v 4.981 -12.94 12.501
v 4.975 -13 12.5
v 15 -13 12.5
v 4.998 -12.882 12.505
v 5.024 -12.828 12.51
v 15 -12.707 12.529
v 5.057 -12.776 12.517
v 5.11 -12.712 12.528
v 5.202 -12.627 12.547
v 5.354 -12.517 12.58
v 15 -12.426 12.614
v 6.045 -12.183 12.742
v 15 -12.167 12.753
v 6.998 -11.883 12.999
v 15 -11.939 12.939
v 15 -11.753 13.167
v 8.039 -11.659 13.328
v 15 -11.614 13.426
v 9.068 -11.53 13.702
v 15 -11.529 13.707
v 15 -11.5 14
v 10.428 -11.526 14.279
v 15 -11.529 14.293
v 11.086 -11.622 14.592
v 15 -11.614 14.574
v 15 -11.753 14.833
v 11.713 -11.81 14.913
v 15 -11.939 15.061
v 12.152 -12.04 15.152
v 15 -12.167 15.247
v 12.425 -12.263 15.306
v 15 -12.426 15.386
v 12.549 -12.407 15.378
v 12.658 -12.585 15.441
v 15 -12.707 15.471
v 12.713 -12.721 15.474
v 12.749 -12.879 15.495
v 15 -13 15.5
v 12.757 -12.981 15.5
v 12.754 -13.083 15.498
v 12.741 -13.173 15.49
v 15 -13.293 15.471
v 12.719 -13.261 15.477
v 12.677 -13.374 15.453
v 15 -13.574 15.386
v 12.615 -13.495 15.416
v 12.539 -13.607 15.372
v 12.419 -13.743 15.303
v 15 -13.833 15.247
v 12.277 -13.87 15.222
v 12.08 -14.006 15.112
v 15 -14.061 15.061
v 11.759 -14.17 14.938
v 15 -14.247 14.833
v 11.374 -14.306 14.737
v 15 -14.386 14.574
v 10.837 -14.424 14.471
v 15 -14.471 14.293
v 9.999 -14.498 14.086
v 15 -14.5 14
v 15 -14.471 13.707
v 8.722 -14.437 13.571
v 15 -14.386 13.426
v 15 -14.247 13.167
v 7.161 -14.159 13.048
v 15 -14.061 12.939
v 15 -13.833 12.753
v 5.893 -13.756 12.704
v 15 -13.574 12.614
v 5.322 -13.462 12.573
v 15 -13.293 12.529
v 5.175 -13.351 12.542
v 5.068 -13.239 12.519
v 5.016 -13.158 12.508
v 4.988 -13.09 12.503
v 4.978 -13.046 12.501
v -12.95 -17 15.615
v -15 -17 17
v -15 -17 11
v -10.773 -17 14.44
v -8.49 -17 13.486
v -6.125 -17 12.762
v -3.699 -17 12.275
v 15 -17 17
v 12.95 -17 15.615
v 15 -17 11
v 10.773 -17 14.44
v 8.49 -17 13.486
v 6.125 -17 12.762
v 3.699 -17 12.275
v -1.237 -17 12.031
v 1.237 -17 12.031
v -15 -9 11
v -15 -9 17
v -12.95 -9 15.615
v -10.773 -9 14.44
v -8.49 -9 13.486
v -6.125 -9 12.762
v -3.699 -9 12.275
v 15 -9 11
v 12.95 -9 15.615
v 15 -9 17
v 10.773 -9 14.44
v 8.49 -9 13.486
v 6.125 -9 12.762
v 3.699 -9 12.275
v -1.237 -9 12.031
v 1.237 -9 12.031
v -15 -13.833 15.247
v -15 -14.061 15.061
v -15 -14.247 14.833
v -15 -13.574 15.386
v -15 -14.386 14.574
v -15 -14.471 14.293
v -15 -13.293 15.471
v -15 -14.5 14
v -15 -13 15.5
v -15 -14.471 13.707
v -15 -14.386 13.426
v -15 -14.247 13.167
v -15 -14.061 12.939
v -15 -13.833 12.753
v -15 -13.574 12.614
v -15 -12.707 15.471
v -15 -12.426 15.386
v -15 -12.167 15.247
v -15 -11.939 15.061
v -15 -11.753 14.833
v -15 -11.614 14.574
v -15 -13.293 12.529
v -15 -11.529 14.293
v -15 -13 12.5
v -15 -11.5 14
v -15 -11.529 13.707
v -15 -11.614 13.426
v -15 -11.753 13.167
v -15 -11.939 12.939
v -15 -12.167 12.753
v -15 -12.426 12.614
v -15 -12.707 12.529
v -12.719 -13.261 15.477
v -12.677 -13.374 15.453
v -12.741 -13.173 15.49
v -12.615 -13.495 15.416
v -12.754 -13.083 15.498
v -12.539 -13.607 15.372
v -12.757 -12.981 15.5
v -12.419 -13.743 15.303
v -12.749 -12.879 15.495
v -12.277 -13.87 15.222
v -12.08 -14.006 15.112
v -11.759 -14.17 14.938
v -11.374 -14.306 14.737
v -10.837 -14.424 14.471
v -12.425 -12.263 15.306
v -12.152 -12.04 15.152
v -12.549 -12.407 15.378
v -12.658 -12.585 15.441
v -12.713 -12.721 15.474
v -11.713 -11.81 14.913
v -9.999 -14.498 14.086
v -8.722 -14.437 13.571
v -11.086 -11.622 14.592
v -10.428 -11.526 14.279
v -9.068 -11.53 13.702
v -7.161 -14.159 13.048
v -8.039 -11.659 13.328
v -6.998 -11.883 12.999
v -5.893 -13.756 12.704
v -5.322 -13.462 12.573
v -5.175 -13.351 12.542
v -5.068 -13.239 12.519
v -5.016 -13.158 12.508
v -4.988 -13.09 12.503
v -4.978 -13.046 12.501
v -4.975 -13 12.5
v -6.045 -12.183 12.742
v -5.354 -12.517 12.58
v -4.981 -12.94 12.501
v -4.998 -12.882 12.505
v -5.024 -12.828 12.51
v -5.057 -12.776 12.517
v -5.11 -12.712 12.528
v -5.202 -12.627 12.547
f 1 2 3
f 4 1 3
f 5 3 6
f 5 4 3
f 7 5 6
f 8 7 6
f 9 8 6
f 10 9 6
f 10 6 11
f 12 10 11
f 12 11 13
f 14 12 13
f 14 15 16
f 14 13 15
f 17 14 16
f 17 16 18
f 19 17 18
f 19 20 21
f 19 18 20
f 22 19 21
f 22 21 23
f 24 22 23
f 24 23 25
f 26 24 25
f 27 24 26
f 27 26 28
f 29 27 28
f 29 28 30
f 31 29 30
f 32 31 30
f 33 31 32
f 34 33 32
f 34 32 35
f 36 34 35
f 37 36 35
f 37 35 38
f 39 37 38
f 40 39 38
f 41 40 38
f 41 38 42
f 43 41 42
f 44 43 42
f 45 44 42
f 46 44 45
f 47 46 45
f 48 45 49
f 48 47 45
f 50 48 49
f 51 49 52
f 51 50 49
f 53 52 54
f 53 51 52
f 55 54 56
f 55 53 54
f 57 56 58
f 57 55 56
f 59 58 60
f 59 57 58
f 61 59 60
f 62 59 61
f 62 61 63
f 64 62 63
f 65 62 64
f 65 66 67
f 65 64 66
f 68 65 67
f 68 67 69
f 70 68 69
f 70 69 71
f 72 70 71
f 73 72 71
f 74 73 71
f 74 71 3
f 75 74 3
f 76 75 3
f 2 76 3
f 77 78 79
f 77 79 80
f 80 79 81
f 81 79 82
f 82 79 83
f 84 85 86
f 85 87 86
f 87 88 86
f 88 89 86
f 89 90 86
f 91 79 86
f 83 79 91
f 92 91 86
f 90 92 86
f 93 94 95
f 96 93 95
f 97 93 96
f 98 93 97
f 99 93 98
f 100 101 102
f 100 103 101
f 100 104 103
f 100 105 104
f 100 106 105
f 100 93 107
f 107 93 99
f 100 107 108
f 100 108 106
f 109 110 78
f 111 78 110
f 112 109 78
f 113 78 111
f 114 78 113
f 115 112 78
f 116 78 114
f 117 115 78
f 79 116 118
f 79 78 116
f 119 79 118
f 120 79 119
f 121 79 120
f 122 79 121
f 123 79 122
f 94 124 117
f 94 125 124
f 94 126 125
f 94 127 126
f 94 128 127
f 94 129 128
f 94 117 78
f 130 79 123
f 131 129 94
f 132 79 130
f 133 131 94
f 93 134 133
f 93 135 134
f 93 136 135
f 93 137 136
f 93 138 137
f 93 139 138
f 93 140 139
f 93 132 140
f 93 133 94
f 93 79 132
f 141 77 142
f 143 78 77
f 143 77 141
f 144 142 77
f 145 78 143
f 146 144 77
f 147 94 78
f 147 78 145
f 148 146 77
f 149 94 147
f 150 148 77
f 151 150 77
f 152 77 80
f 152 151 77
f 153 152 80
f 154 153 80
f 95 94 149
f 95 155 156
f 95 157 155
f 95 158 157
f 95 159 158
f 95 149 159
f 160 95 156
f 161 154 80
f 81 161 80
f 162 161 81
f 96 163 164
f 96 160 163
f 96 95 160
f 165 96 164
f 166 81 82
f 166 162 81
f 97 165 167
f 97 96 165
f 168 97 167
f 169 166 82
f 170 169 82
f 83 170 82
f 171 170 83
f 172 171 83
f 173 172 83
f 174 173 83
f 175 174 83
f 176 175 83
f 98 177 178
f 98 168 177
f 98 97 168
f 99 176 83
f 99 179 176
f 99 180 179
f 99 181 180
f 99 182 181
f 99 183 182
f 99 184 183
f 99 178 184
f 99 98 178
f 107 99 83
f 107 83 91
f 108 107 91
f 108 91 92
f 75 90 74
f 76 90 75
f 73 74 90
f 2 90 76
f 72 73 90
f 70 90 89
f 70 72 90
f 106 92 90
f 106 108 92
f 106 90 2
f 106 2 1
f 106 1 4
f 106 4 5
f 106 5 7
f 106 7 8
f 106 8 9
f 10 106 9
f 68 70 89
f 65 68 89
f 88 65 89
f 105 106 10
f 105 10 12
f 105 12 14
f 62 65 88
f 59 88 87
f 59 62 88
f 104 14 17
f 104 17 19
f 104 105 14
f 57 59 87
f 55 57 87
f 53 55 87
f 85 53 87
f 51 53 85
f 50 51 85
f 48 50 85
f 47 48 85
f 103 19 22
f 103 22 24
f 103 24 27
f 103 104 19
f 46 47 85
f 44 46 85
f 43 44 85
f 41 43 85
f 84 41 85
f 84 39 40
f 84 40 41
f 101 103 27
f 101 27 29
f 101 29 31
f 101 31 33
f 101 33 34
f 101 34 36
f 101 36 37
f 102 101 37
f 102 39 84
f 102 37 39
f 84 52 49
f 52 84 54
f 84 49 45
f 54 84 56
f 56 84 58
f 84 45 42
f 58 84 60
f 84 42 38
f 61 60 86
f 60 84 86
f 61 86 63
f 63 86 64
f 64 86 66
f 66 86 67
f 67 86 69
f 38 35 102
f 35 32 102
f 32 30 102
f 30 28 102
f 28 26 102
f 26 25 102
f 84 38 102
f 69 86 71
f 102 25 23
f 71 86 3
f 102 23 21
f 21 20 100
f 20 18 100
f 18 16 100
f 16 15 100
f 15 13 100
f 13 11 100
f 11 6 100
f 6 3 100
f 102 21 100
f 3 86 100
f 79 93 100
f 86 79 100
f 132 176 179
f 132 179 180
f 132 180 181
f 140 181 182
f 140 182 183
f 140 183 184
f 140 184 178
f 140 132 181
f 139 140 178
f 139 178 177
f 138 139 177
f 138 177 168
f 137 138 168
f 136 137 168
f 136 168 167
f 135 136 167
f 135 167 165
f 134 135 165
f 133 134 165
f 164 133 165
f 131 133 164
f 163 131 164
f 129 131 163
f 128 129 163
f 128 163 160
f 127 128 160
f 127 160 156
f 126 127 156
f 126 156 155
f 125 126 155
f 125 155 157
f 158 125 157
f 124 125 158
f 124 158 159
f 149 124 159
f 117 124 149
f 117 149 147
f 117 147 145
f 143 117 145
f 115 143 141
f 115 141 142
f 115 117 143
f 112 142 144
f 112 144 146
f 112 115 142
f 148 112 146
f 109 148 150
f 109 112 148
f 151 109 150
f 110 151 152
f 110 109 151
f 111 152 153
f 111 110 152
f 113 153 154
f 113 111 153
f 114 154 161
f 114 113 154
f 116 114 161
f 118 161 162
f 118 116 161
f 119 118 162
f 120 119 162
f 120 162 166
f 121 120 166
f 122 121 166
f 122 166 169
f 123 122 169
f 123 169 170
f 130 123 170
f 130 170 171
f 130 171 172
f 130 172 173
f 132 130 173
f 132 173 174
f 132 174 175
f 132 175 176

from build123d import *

# Parameters (mm, degrees)
CYLINDER2792_R     = 1.5
CYLINDER2792_DEPTH = 64
CYLINDER2791_R     = 38
CYLINDER2791_DEPTH = 30
BOX975_W           = 2
BOX975_H           = 6
BOX975_DEPTH       = 6
BOX976_W           = 2
BOX976_H           = 6
BOX976_DEPTH       = 6
BOX977_W           = 2
BOX977_H           = 6
BOX977_DEPTH       = 6
BOX978_W           = 2
BOX978_H           = 6
BOX978_DEPTH       = 6
BOX979_W           = 2
BOX979_H           = 6
BOX979_DEPTH       = 6
BOX981_W           = 2
BOX981_H           = 6
BOX981_DEPTH       = 6
TUBE137_R          = 21
TUBE137_R_2        = 2
TUBE137_DEPTH      = 64
TUBE138_R          = 25
TUBE138_R_2        = 2
TUBE138_DEPTH      = 26
BOX980_W           = 30
BOX980_H           = 64
BOX980_DEPTH       = 18
BOX974_W           = 30
BOX974_H           = 8
BOX974_DEPTH       = 18


with BuildPart() as v_lec2762:
    # Cylinder2792 → Cylinder2792 (new body)
    with BuildSketch(Plane(origin=(-26, -13, 14), x_dir=(0, 0, -1), z_dir=(1, 0, 0))):
        Circle(CYLINDER2792_R)
    extrude(amount=CYLINDER2792_DEPTH)


with BuildPart() as v_lec2761:
    # Cylinder2791 → Cylinder2791 (new body)
    with BuildSketch(Plane.XY):
        Circle(CYLINDER2791_R)
    extrude(amount=CYLINDER2791_DEPTH)


with BuildPart() as krychle974:
    # Box975 → Box975 (new body)
    with BuildSketch(Plane(origin=(-12, -4, 10), x_dir=(1, 0, 0), z_dir=(0, 0, 1))):
        with Locations((1, 3)):
            Rectangle(BOX975_W, BOX975_H)
    extrude(amount=BOX975_DEPTH)


with BuildPart() as krychle975:
    # Box976 → Box976 (new body)
    with BuildSketch(Plane(origin=(10, 26, 10), x_dir=(1, 0, 0), z_dir=(0, 0, 1))):
        with Locations((1, 3)):
            Rectangle(BOX976_W, BOX976_H)
    extrude(amount=BOX976_DEPTH)


with BuildPart() as krychle976:
    # Box977 → Box977 (new body)
    with BuildSketch(Plane(origin=(-12, 26, 10), x_dir=(1, 0, 0), z_dir=(0, 0, 1))):
        with Locations((1, 3)):
            Rectangle(BOX977_W, BOX977_H)
    extrude(amount=BOX977_DEPTH)


with BuildPart() as krychle977:
    # Box978 → Box978 (new body)
    with BuildSketch(Plane(origin=(10, 12, 10), x_dir=(1, 0, 0), z_dir=(0, 0, 1))):
        with Locations((1, 3)):
            Rectangle(BOX978_W, BOX978_H)
    extrude(amount=BOX978_DEPTH)


with BuildPart() as krychle978:
    # Box979 → Box979 (new body)
    with BuildSketch(Plane(origin=(-12, 12, 10), x_dir=(1, 0, 0), z_dir=(0, 0, 1))):
        with Locations((1, 3)):
            Rectangle(BOX979_W, BOX979_H)
    extrude(amount=BOX979_DEPTH)


with BuildPart() as compound1243:
    # Box981 → Box981 (new body)
    with BuildSketch(Plane(origin=(10, -4, 10), x_dir=(1, 0, 0), z_dir=(0, 0, 1))):
        with Locations((1, 3)):
            Rectangle(BOX981_W, BOX981_H)
    extrude(amount=BOX981_DEPTH)

    # Compound1243: union Krychle974, Krychle975, Krychle976, Krychle977, Krychle978
    add(krychle974.part)
    add(krychle975.part)
    add(krychle976.part)
    add(krychle977.part)
    add(krychle978.part)


with BuildPart() as tube137:
    # Tube137 → Tube137 (new body)
    with BuildSketch(Plane(origin=(0, 61, 37), x_dir=(1, 0, 0), z_dir=(0, -1, 0))):
        Circle(TUBE137_R)
        Circle(TUBE137_R_2, mode=Mode.SUBTRACT)
    extrude(amount=TUBE137_DEPTH)


with BuildPart() as tube138:
    # Tube138 → Tube138 (new body)
    with BuildSketch(Plane(origin=(0, -3, 37), x_dir=(1, 0, 0), z_dir=(0, -1, 0))):
        Circle(TUBE138_R)
        Circle(TUBE138_R_2, mode=Mode.SUBTRACT)
    extrude(amount=TUBE138_DEPTH)


with BuildPart() as common007:
    # Box980 → Box980 (new body)
    with BuildSketch(Plane(origin=(-15, -17, 11), x_dir=(1, 0, 0), z_dir=(0, 0, 1))):
        with Locations((15, 32)):
            Rectangle(BOX980_W, BOX980_H)
    extrude(amount=BOX980_DEPTH)

    # Cut1049: cut Tube138
    add(tube138.part, mode=Mode.SUBTRACT)

    # Cut1050: cut Tube137
    add(tube137.part, mode=Mode.SUBTRACT)

    # Cut1051: cut Compound1243
    add(compound1243.part, mode=Mode.SUBTRACT)

    # Common007: intersect Válec2761
    add(v_lec2761.part, mode=Mode.INTERSECT)


with BuildPart() as cut1052:
    # Box974 → Box974 (new body)
    with BuildSketch(Plane(origin=(-15, -17, 11), x_dir=(1, 0, 0), z_dir=(0, 0, 1))):
        with Locations((15, 4)):
            Rectangle(BOX974_W, BOX974_H)
    extrude(amount=BOX974_DEPTH)

    # Common008: intersect Common007
    add(common007.part, mode=Mode.INTERSECT)

    # Cut1052: cut Válec2762
    add(v_lec2762.part, mode=Mode.SUBTRACT)


solid = cut1052.part
